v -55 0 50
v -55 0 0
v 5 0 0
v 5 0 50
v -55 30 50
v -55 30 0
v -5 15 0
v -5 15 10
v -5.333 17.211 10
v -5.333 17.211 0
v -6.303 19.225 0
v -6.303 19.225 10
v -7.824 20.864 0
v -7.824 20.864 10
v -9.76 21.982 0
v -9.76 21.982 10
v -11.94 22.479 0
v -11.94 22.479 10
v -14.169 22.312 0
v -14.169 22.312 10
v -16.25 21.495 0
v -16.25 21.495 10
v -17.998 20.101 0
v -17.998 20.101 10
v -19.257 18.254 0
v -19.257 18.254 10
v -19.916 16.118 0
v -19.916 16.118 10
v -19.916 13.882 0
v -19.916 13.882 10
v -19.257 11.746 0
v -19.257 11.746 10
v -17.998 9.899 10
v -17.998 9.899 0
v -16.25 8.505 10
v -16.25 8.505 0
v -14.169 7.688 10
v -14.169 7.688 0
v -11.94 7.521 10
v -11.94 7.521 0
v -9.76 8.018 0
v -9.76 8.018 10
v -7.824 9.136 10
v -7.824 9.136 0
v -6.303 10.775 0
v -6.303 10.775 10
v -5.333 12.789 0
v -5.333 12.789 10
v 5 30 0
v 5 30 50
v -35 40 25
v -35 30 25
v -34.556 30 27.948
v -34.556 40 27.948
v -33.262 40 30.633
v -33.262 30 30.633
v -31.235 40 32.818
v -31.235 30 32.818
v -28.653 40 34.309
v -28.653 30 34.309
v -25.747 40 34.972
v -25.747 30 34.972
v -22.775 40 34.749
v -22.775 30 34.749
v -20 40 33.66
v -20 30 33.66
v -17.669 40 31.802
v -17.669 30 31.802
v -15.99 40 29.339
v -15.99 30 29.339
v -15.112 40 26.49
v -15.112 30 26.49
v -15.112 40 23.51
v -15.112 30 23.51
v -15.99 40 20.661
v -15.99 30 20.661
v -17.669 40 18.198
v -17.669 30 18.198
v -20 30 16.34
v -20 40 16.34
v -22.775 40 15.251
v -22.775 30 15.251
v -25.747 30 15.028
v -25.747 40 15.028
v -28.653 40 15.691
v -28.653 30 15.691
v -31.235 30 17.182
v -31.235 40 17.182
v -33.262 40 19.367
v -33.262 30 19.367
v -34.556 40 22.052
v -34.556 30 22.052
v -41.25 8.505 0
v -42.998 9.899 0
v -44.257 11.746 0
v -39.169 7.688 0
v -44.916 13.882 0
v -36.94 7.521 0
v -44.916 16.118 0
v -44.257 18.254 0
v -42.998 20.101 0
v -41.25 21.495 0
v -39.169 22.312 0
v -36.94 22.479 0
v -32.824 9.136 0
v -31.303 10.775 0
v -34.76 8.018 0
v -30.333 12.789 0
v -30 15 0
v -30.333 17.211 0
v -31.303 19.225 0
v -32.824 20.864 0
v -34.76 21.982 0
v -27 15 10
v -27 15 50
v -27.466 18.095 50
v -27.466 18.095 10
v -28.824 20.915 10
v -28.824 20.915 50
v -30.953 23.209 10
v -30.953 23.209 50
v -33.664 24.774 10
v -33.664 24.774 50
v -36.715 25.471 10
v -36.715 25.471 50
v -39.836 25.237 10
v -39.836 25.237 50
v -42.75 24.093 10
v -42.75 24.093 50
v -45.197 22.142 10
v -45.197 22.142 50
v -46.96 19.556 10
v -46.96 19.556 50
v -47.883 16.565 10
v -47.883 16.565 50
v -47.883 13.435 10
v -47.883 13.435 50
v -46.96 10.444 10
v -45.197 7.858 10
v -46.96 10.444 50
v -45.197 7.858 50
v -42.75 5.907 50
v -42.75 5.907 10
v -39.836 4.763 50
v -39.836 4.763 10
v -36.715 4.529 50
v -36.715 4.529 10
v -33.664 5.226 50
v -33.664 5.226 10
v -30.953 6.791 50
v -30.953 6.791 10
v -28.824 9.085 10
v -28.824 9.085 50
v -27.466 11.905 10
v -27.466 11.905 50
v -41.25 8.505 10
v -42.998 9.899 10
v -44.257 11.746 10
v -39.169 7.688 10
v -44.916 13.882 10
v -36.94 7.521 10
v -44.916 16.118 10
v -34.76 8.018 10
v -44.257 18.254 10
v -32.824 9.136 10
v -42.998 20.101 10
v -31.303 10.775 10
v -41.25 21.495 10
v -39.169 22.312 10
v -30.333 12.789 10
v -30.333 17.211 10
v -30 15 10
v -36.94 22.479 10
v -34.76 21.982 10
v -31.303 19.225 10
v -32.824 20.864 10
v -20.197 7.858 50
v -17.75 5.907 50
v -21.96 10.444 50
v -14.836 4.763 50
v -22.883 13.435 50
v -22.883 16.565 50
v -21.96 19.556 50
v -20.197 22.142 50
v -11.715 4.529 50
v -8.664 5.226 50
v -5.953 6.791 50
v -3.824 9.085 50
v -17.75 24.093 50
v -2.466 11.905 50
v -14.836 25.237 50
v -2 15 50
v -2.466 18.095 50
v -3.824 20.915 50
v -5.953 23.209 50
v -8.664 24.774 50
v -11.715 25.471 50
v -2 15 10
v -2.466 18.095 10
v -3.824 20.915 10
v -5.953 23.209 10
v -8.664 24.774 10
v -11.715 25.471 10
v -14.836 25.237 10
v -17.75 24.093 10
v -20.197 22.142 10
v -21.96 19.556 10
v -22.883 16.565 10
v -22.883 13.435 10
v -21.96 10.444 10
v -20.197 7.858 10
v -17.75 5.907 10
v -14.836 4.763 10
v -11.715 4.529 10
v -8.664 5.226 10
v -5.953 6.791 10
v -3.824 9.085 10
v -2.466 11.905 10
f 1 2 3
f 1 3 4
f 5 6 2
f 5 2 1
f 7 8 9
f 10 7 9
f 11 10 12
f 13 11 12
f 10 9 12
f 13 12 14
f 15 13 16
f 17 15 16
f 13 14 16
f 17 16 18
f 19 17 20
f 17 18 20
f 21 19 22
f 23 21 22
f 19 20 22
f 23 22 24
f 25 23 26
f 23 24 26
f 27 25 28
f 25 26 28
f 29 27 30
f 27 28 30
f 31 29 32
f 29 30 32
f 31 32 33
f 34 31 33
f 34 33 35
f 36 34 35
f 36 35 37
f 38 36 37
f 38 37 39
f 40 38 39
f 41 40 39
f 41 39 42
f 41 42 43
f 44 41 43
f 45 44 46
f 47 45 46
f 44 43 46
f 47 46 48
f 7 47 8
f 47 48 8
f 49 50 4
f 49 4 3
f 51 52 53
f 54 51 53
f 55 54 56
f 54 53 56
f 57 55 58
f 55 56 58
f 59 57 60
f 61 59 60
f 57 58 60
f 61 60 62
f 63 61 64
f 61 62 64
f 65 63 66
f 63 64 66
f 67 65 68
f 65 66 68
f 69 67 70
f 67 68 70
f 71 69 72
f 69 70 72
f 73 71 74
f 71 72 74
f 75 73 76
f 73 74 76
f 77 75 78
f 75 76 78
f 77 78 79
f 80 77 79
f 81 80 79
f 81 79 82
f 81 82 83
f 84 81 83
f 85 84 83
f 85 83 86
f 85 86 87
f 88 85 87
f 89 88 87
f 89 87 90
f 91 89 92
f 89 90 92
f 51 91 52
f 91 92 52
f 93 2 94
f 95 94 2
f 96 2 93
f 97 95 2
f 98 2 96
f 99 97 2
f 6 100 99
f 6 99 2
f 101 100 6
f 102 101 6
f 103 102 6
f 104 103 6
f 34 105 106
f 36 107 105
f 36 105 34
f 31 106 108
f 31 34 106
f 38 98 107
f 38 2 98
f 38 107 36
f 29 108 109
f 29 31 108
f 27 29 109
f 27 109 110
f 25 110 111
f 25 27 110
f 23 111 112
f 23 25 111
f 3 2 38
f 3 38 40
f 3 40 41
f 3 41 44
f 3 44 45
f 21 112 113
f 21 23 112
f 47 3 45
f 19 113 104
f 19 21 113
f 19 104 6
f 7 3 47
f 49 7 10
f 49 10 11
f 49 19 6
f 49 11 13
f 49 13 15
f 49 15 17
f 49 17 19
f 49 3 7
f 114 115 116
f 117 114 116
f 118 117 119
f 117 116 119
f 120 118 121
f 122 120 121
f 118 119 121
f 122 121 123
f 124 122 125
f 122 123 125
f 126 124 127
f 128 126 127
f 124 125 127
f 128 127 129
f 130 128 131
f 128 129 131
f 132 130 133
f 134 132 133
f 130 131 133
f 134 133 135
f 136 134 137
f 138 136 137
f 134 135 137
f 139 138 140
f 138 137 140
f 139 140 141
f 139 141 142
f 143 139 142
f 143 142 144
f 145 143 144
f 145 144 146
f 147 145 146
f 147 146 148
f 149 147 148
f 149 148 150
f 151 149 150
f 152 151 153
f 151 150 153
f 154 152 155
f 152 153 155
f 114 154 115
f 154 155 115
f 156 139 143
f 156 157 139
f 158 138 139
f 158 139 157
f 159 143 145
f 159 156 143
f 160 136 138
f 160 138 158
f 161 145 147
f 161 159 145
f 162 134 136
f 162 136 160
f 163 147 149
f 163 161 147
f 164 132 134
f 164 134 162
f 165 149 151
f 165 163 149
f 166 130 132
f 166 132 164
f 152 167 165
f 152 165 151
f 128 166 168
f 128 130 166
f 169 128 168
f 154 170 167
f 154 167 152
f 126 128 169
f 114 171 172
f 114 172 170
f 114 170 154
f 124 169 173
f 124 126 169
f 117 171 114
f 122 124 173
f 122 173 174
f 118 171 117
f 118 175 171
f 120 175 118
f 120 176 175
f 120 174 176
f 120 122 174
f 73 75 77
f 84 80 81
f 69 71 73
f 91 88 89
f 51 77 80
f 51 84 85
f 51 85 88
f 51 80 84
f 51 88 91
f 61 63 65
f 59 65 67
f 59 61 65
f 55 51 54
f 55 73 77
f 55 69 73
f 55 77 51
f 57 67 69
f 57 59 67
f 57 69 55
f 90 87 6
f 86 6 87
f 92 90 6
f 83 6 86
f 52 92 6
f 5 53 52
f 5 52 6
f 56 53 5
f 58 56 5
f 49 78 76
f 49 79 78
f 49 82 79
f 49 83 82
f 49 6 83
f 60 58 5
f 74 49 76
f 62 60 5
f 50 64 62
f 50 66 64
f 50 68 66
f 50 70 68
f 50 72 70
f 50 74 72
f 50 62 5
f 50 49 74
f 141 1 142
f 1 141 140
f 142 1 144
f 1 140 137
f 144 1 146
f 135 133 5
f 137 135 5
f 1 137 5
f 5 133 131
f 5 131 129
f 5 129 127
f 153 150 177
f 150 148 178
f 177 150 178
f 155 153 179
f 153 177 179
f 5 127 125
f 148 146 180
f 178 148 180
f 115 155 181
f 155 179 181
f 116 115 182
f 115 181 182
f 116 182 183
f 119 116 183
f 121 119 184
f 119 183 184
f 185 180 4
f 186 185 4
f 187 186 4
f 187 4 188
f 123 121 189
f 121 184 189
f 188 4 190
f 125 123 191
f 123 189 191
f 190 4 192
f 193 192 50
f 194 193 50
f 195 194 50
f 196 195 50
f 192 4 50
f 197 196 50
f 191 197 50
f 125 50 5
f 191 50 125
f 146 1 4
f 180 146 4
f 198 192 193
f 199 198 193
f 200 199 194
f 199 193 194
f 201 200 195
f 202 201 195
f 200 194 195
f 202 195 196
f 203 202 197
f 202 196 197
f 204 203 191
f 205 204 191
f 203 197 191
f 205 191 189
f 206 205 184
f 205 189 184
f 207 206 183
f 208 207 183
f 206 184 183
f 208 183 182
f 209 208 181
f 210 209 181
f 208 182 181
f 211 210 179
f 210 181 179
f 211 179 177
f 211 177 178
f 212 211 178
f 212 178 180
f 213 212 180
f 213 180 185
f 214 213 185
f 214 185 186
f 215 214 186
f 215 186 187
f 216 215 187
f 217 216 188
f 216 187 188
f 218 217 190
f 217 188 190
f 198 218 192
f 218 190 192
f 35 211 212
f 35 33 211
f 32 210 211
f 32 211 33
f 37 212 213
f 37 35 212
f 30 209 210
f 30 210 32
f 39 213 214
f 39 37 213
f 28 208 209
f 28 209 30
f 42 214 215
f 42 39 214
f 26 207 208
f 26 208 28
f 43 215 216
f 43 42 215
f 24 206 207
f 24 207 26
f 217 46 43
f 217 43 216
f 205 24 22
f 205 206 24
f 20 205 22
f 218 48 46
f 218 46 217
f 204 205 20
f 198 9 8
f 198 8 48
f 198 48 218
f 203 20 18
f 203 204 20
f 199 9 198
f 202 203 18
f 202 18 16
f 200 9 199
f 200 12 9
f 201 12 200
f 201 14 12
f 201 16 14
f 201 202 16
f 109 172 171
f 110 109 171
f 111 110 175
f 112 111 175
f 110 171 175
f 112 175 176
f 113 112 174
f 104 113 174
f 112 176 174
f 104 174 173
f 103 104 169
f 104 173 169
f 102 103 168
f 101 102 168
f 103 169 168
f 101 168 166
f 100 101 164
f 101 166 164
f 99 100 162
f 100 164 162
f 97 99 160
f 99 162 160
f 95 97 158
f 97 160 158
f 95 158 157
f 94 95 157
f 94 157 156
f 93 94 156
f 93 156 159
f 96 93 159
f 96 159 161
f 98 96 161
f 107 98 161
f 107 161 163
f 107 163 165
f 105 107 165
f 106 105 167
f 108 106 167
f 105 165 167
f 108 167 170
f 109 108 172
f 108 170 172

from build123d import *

# Parameters (mm, degrees)
SKETCH1_W           = 50
SKETCH1_H           = 30
BOSS_EXTRUDE1_DEPTH = 10
SKETCH2_R           = 7.5
CUT_EXTRUDE1_DEPTH  = 10
SKETCH3_W           = 50
SKETCH3_H           = 30
BOSS_EXTRUDE2_DEPTH = 40
SKETCH4_R           = 10.5
CUT_EXTRUDE2_DEPTH  = 40
SKETCH5_W           = 50
SKETCH5_H           = 30
BOSS_EXTRUDE3_DEPTH = 5
SKETCH6_W           = 50
SKETCH6_H           = 30
BOSS_EXTRUDE4_DEPTH = 5
SKETCH7_R           = 10
BOSS_EXTRUDE5_DEPTH = 10


with BuildPart() as part:
    # Sketch1 → Boss-Extrude1 (new body)
    with BuildSketch(Plane.XY):
        with Locations((-25, 15)):
            Rectangle(SKETCH1_W, SKETCH1_H)
    extrude(amount=BOSS_EXTRUDE1_DEPTH)

    # Sketch2 → Cut-Extrude1 (cut)
    with BuildSketch(Plane.XY.offset(10)):
        with Locations((-37.5, 15)):
            Circle(SKETCH2_R)
        with Locations((-12.5, 15)):
            Circle(SKETCH2_R)
    extrude(amount=-CUT_EXTRUDE1_DEPTH, mode=Mode.SUBTRACT)

    # Sketch3 → Boss-Extrude2 (add)
    with BuildSketch(Plane.XY.offset(10)):
        with Locations((-25, 15)):
            Rectangle(SKETCH3_W, SKETCH3_H)
    extrude(amount=BOSS_EXTRUDE2_DEPTH)

    # Sketch4 → Cut-Extrude2 (cut)
    with BuildSketch(Plane.XY.offset(50)):
        with Locations((-37.5, 15)):
            Circle(SKETCH4_R)
        with Locations((-12.5, 15)):
            Circle(SKETCH4_R)
    extrude(amount=-CUT_EXTRUDE2_DEPTH, mode=Mode.SUBTRACT)

    # Sketch5 → Boss-Extrude3 (add)
    with BuildSketch(Plane(origin=(0, 0, 0), x_dir=(0, 0, -1), z_dir=(1, 0, 0))):
        with Locations((-25, 15)):
            Rectangle(SKETCH5_W, SKETCH5_H)
    extrude(amount=BOSS_EXTRUDE3_DEPTH)

    # Sketch6 → Boss-Extrude4 (add)
    with BuildSketch(Plane.ZY.offset(50)):
        with Locations((25, 15)):
            Rectangle(SKETCH6_W, SKETCH6_H)
    extrude(amount=BOSS_EXTRUDE4_DEPTH)

    # Sketch7 → Boss-Extrude5 (add)
    with BuildSketch(Plane(origin=(0, 30, 0), x_dir=(1, 0, 0), z_dir=(0, 1, 0))):
        with Locations(Location((-25, -25, 0), (0, 0, 180))):
            Circle(SKETCH7_R)
    extrude(amount=BOSS_EXTRUDE5_DEPTH)


solid = part.part
